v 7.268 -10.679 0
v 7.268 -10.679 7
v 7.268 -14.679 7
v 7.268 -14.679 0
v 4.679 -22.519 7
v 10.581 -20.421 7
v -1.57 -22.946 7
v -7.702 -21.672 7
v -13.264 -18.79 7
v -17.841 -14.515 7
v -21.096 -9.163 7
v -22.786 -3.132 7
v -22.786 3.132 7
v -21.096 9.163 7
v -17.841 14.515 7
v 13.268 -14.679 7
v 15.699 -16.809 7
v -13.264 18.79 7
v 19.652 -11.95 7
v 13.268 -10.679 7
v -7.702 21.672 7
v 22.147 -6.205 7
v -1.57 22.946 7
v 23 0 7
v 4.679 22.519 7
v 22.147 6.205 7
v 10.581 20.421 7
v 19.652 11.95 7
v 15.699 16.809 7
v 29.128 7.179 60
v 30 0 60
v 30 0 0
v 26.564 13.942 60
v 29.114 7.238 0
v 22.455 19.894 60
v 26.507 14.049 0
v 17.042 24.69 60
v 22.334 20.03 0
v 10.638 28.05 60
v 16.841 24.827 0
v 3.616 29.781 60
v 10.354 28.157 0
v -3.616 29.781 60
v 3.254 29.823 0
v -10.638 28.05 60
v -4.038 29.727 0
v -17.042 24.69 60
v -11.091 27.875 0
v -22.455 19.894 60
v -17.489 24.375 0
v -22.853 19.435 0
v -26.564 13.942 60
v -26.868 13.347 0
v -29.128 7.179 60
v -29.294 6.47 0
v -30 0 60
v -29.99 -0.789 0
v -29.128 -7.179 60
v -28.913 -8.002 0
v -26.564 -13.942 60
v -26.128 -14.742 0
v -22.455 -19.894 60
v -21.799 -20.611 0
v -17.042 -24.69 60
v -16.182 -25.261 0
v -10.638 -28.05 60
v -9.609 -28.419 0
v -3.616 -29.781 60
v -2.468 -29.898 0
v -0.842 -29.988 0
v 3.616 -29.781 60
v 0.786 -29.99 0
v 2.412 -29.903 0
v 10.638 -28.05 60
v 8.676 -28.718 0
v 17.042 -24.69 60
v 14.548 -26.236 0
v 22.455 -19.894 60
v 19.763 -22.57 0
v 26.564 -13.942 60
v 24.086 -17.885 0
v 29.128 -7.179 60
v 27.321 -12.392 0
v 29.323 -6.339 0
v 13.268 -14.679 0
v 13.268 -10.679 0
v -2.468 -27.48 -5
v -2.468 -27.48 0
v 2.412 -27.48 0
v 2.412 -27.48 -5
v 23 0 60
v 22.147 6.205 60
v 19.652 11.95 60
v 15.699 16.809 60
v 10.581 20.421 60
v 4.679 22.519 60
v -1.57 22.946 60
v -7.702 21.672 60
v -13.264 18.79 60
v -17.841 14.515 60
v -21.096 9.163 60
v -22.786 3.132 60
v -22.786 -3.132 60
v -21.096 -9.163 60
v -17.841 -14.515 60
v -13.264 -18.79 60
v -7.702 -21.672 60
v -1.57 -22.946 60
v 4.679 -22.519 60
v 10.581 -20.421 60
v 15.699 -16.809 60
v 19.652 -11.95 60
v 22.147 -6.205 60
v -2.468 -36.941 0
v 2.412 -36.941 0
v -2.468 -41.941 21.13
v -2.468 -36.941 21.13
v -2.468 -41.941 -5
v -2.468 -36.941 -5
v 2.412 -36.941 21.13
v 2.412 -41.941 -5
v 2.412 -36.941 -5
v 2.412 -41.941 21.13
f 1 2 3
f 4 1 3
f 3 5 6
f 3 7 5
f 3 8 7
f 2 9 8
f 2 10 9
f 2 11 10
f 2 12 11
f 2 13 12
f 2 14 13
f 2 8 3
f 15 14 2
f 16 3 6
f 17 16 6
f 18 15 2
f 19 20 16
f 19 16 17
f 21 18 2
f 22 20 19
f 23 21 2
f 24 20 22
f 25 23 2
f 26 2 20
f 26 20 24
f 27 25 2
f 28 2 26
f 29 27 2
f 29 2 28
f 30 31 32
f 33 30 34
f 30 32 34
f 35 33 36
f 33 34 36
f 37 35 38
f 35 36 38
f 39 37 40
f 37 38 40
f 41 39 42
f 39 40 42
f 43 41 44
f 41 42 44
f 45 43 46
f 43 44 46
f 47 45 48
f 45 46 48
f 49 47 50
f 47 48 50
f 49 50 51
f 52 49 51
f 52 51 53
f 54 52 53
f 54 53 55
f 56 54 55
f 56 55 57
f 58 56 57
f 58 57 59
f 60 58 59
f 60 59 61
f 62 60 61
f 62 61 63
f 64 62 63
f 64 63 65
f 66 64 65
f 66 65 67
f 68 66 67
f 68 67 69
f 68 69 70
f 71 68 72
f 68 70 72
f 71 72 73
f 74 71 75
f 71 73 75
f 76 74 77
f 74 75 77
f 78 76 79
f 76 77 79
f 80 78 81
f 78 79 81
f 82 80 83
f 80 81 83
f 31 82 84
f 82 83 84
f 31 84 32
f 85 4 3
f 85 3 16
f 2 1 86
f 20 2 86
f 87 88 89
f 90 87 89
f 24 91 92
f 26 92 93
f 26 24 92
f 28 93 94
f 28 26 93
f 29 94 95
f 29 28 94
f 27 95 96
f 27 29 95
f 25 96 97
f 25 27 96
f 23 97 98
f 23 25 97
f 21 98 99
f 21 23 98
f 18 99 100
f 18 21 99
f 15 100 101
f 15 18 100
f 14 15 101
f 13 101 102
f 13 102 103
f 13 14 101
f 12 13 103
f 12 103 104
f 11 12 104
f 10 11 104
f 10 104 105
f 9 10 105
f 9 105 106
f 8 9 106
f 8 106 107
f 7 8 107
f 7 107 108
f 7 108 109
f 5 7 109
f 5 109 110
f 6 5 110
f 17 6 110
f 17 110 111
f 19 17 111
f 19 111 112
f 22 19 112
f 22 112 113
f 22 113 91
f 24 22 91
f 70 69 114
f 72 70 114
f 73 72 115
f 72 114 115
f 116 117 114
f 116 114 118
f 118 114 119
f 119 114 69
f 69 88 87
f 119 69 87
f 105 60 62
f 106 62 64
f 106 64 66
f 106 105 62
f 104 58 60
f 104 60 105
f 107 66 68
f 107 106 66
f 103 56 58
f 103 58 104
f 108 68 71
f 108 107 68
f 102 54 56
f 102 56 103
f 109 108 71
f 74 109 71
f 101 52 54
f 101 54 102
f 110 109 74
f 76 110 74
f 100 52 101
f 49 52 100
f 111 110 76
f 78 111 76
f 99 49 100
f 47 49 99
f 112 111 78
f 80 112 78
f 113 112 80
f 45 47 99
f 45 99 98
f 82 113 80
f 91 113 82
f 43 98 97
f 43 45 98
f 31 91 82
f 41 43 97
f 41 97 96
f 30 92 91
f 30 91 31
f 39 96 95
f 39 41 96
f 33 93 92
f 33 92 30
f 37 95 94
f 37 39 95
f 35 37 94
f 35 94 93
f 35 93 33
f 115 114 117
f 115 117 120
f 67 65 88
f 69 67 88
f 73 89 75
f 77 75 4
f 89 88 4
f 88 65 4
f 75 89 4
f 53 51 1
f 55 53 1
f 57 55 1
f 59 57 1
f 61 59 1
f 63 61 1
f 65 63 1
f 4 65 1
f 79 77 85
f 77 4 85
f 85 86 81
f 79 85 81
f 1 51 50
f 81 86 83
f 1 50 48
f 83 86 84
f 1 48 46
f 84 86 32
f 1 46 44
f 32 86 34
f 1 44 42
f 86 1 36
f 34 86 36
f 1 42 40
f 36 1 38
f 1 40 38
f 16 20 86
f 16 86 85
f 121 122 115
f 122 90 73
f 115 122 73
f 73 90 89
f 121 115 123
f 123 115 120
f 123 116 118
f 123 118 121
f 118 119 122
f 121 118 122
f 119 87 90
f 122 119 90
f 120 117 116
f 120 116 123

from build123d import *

# Parameters (mm, degrees)
F0_R     = 30
F1_DEPTH = 60
F2_T     = -7
F3_W     = 6
F3_H     = 4
F4_DEPTH = 7
F6_DEPTH = 5
F7_W     = 4.8802027013
F7_H     = 21.1299806833
F7_H_2   = 5
F8_DEPTH = 5


with BuildPart() as f1:
    # F0 (on Top) → F1 (new body)
    with BuildSketch(Plane.XY):
        Circle(F0_R)
    extrude(amount=F1_DEPTH)

    # F2
    f2_openings = [f1.faces().sort_by_distance(p)[0] for p in [
        (0, 0, 60),
    ]]
    offset(amount=F2_T, openings=f2_openings)

    # F3 (on face) → F4 (cut)
    with BuildSketch(Plane(origin=(0, 0, 0), x_dir=(1, 0, 0), z_dir=(0, 0, -1))):
        with Locations((10.2678574622, 12.6785714924)):
            Rectangle(F3_W, F3_H)
    extrude(amount=-F4_DEPTH, mode=Mode.SUBTRACT)

    # F5 (on face) → F6 (join)
    with BuildSketch(Plane(origin=(0, 0, 0), x_dir=(1, 0, 0), z_dir=(0, 0, -1))):
        with BuildLine():
            Line((-2.4681275245, 36.9405262172), (-2.4681275245, 29.8983000608))
            ThreePointArc((-2.4681275245, 29.8983000608), (-0.0281193423, 29.9999868217), (2.4120751768, 29.9028743324))
            Line((2.4120751768, 29.9028743324), (2.4120751768, 36.9405262172))
            Line((2.4120751768, 36.9405262172), (-2.4681275245, 36.9405262172))
        make_face()
        with BuildLine():
            Line((-2.4681275245, 29.8983000608), (-2.4681275245, 27.4804420769))
            Line((-2.4681275245, 27.4804420769), (2.4120751768, 27.4804420769))
            Line((2.4120751768, 27.4804420769), (2.4120751768, 29.9028743324))
            ThreePointArc((2.4120751768, 29.9028743324), (-0.0281193423, 29.9999868217), (-2.4681275245, 29.8983000608))
        make_face()
    extrude(amount=F6_DEPTH)

    # F7 (on face) → F8 (join)
    with BuildSketch(Plane.XZ.offset(36.9405262172)):
        with Locations((-0.0280261738, 10.5649903417)):
            Rectangle(F7_W, F7_H)
        with Locations((-0.0280261738, -2.5)):
            Rectangle(F7_W, F7_H_2)
    extrude(amount=F8_DEPTH)


solid = f1.part
